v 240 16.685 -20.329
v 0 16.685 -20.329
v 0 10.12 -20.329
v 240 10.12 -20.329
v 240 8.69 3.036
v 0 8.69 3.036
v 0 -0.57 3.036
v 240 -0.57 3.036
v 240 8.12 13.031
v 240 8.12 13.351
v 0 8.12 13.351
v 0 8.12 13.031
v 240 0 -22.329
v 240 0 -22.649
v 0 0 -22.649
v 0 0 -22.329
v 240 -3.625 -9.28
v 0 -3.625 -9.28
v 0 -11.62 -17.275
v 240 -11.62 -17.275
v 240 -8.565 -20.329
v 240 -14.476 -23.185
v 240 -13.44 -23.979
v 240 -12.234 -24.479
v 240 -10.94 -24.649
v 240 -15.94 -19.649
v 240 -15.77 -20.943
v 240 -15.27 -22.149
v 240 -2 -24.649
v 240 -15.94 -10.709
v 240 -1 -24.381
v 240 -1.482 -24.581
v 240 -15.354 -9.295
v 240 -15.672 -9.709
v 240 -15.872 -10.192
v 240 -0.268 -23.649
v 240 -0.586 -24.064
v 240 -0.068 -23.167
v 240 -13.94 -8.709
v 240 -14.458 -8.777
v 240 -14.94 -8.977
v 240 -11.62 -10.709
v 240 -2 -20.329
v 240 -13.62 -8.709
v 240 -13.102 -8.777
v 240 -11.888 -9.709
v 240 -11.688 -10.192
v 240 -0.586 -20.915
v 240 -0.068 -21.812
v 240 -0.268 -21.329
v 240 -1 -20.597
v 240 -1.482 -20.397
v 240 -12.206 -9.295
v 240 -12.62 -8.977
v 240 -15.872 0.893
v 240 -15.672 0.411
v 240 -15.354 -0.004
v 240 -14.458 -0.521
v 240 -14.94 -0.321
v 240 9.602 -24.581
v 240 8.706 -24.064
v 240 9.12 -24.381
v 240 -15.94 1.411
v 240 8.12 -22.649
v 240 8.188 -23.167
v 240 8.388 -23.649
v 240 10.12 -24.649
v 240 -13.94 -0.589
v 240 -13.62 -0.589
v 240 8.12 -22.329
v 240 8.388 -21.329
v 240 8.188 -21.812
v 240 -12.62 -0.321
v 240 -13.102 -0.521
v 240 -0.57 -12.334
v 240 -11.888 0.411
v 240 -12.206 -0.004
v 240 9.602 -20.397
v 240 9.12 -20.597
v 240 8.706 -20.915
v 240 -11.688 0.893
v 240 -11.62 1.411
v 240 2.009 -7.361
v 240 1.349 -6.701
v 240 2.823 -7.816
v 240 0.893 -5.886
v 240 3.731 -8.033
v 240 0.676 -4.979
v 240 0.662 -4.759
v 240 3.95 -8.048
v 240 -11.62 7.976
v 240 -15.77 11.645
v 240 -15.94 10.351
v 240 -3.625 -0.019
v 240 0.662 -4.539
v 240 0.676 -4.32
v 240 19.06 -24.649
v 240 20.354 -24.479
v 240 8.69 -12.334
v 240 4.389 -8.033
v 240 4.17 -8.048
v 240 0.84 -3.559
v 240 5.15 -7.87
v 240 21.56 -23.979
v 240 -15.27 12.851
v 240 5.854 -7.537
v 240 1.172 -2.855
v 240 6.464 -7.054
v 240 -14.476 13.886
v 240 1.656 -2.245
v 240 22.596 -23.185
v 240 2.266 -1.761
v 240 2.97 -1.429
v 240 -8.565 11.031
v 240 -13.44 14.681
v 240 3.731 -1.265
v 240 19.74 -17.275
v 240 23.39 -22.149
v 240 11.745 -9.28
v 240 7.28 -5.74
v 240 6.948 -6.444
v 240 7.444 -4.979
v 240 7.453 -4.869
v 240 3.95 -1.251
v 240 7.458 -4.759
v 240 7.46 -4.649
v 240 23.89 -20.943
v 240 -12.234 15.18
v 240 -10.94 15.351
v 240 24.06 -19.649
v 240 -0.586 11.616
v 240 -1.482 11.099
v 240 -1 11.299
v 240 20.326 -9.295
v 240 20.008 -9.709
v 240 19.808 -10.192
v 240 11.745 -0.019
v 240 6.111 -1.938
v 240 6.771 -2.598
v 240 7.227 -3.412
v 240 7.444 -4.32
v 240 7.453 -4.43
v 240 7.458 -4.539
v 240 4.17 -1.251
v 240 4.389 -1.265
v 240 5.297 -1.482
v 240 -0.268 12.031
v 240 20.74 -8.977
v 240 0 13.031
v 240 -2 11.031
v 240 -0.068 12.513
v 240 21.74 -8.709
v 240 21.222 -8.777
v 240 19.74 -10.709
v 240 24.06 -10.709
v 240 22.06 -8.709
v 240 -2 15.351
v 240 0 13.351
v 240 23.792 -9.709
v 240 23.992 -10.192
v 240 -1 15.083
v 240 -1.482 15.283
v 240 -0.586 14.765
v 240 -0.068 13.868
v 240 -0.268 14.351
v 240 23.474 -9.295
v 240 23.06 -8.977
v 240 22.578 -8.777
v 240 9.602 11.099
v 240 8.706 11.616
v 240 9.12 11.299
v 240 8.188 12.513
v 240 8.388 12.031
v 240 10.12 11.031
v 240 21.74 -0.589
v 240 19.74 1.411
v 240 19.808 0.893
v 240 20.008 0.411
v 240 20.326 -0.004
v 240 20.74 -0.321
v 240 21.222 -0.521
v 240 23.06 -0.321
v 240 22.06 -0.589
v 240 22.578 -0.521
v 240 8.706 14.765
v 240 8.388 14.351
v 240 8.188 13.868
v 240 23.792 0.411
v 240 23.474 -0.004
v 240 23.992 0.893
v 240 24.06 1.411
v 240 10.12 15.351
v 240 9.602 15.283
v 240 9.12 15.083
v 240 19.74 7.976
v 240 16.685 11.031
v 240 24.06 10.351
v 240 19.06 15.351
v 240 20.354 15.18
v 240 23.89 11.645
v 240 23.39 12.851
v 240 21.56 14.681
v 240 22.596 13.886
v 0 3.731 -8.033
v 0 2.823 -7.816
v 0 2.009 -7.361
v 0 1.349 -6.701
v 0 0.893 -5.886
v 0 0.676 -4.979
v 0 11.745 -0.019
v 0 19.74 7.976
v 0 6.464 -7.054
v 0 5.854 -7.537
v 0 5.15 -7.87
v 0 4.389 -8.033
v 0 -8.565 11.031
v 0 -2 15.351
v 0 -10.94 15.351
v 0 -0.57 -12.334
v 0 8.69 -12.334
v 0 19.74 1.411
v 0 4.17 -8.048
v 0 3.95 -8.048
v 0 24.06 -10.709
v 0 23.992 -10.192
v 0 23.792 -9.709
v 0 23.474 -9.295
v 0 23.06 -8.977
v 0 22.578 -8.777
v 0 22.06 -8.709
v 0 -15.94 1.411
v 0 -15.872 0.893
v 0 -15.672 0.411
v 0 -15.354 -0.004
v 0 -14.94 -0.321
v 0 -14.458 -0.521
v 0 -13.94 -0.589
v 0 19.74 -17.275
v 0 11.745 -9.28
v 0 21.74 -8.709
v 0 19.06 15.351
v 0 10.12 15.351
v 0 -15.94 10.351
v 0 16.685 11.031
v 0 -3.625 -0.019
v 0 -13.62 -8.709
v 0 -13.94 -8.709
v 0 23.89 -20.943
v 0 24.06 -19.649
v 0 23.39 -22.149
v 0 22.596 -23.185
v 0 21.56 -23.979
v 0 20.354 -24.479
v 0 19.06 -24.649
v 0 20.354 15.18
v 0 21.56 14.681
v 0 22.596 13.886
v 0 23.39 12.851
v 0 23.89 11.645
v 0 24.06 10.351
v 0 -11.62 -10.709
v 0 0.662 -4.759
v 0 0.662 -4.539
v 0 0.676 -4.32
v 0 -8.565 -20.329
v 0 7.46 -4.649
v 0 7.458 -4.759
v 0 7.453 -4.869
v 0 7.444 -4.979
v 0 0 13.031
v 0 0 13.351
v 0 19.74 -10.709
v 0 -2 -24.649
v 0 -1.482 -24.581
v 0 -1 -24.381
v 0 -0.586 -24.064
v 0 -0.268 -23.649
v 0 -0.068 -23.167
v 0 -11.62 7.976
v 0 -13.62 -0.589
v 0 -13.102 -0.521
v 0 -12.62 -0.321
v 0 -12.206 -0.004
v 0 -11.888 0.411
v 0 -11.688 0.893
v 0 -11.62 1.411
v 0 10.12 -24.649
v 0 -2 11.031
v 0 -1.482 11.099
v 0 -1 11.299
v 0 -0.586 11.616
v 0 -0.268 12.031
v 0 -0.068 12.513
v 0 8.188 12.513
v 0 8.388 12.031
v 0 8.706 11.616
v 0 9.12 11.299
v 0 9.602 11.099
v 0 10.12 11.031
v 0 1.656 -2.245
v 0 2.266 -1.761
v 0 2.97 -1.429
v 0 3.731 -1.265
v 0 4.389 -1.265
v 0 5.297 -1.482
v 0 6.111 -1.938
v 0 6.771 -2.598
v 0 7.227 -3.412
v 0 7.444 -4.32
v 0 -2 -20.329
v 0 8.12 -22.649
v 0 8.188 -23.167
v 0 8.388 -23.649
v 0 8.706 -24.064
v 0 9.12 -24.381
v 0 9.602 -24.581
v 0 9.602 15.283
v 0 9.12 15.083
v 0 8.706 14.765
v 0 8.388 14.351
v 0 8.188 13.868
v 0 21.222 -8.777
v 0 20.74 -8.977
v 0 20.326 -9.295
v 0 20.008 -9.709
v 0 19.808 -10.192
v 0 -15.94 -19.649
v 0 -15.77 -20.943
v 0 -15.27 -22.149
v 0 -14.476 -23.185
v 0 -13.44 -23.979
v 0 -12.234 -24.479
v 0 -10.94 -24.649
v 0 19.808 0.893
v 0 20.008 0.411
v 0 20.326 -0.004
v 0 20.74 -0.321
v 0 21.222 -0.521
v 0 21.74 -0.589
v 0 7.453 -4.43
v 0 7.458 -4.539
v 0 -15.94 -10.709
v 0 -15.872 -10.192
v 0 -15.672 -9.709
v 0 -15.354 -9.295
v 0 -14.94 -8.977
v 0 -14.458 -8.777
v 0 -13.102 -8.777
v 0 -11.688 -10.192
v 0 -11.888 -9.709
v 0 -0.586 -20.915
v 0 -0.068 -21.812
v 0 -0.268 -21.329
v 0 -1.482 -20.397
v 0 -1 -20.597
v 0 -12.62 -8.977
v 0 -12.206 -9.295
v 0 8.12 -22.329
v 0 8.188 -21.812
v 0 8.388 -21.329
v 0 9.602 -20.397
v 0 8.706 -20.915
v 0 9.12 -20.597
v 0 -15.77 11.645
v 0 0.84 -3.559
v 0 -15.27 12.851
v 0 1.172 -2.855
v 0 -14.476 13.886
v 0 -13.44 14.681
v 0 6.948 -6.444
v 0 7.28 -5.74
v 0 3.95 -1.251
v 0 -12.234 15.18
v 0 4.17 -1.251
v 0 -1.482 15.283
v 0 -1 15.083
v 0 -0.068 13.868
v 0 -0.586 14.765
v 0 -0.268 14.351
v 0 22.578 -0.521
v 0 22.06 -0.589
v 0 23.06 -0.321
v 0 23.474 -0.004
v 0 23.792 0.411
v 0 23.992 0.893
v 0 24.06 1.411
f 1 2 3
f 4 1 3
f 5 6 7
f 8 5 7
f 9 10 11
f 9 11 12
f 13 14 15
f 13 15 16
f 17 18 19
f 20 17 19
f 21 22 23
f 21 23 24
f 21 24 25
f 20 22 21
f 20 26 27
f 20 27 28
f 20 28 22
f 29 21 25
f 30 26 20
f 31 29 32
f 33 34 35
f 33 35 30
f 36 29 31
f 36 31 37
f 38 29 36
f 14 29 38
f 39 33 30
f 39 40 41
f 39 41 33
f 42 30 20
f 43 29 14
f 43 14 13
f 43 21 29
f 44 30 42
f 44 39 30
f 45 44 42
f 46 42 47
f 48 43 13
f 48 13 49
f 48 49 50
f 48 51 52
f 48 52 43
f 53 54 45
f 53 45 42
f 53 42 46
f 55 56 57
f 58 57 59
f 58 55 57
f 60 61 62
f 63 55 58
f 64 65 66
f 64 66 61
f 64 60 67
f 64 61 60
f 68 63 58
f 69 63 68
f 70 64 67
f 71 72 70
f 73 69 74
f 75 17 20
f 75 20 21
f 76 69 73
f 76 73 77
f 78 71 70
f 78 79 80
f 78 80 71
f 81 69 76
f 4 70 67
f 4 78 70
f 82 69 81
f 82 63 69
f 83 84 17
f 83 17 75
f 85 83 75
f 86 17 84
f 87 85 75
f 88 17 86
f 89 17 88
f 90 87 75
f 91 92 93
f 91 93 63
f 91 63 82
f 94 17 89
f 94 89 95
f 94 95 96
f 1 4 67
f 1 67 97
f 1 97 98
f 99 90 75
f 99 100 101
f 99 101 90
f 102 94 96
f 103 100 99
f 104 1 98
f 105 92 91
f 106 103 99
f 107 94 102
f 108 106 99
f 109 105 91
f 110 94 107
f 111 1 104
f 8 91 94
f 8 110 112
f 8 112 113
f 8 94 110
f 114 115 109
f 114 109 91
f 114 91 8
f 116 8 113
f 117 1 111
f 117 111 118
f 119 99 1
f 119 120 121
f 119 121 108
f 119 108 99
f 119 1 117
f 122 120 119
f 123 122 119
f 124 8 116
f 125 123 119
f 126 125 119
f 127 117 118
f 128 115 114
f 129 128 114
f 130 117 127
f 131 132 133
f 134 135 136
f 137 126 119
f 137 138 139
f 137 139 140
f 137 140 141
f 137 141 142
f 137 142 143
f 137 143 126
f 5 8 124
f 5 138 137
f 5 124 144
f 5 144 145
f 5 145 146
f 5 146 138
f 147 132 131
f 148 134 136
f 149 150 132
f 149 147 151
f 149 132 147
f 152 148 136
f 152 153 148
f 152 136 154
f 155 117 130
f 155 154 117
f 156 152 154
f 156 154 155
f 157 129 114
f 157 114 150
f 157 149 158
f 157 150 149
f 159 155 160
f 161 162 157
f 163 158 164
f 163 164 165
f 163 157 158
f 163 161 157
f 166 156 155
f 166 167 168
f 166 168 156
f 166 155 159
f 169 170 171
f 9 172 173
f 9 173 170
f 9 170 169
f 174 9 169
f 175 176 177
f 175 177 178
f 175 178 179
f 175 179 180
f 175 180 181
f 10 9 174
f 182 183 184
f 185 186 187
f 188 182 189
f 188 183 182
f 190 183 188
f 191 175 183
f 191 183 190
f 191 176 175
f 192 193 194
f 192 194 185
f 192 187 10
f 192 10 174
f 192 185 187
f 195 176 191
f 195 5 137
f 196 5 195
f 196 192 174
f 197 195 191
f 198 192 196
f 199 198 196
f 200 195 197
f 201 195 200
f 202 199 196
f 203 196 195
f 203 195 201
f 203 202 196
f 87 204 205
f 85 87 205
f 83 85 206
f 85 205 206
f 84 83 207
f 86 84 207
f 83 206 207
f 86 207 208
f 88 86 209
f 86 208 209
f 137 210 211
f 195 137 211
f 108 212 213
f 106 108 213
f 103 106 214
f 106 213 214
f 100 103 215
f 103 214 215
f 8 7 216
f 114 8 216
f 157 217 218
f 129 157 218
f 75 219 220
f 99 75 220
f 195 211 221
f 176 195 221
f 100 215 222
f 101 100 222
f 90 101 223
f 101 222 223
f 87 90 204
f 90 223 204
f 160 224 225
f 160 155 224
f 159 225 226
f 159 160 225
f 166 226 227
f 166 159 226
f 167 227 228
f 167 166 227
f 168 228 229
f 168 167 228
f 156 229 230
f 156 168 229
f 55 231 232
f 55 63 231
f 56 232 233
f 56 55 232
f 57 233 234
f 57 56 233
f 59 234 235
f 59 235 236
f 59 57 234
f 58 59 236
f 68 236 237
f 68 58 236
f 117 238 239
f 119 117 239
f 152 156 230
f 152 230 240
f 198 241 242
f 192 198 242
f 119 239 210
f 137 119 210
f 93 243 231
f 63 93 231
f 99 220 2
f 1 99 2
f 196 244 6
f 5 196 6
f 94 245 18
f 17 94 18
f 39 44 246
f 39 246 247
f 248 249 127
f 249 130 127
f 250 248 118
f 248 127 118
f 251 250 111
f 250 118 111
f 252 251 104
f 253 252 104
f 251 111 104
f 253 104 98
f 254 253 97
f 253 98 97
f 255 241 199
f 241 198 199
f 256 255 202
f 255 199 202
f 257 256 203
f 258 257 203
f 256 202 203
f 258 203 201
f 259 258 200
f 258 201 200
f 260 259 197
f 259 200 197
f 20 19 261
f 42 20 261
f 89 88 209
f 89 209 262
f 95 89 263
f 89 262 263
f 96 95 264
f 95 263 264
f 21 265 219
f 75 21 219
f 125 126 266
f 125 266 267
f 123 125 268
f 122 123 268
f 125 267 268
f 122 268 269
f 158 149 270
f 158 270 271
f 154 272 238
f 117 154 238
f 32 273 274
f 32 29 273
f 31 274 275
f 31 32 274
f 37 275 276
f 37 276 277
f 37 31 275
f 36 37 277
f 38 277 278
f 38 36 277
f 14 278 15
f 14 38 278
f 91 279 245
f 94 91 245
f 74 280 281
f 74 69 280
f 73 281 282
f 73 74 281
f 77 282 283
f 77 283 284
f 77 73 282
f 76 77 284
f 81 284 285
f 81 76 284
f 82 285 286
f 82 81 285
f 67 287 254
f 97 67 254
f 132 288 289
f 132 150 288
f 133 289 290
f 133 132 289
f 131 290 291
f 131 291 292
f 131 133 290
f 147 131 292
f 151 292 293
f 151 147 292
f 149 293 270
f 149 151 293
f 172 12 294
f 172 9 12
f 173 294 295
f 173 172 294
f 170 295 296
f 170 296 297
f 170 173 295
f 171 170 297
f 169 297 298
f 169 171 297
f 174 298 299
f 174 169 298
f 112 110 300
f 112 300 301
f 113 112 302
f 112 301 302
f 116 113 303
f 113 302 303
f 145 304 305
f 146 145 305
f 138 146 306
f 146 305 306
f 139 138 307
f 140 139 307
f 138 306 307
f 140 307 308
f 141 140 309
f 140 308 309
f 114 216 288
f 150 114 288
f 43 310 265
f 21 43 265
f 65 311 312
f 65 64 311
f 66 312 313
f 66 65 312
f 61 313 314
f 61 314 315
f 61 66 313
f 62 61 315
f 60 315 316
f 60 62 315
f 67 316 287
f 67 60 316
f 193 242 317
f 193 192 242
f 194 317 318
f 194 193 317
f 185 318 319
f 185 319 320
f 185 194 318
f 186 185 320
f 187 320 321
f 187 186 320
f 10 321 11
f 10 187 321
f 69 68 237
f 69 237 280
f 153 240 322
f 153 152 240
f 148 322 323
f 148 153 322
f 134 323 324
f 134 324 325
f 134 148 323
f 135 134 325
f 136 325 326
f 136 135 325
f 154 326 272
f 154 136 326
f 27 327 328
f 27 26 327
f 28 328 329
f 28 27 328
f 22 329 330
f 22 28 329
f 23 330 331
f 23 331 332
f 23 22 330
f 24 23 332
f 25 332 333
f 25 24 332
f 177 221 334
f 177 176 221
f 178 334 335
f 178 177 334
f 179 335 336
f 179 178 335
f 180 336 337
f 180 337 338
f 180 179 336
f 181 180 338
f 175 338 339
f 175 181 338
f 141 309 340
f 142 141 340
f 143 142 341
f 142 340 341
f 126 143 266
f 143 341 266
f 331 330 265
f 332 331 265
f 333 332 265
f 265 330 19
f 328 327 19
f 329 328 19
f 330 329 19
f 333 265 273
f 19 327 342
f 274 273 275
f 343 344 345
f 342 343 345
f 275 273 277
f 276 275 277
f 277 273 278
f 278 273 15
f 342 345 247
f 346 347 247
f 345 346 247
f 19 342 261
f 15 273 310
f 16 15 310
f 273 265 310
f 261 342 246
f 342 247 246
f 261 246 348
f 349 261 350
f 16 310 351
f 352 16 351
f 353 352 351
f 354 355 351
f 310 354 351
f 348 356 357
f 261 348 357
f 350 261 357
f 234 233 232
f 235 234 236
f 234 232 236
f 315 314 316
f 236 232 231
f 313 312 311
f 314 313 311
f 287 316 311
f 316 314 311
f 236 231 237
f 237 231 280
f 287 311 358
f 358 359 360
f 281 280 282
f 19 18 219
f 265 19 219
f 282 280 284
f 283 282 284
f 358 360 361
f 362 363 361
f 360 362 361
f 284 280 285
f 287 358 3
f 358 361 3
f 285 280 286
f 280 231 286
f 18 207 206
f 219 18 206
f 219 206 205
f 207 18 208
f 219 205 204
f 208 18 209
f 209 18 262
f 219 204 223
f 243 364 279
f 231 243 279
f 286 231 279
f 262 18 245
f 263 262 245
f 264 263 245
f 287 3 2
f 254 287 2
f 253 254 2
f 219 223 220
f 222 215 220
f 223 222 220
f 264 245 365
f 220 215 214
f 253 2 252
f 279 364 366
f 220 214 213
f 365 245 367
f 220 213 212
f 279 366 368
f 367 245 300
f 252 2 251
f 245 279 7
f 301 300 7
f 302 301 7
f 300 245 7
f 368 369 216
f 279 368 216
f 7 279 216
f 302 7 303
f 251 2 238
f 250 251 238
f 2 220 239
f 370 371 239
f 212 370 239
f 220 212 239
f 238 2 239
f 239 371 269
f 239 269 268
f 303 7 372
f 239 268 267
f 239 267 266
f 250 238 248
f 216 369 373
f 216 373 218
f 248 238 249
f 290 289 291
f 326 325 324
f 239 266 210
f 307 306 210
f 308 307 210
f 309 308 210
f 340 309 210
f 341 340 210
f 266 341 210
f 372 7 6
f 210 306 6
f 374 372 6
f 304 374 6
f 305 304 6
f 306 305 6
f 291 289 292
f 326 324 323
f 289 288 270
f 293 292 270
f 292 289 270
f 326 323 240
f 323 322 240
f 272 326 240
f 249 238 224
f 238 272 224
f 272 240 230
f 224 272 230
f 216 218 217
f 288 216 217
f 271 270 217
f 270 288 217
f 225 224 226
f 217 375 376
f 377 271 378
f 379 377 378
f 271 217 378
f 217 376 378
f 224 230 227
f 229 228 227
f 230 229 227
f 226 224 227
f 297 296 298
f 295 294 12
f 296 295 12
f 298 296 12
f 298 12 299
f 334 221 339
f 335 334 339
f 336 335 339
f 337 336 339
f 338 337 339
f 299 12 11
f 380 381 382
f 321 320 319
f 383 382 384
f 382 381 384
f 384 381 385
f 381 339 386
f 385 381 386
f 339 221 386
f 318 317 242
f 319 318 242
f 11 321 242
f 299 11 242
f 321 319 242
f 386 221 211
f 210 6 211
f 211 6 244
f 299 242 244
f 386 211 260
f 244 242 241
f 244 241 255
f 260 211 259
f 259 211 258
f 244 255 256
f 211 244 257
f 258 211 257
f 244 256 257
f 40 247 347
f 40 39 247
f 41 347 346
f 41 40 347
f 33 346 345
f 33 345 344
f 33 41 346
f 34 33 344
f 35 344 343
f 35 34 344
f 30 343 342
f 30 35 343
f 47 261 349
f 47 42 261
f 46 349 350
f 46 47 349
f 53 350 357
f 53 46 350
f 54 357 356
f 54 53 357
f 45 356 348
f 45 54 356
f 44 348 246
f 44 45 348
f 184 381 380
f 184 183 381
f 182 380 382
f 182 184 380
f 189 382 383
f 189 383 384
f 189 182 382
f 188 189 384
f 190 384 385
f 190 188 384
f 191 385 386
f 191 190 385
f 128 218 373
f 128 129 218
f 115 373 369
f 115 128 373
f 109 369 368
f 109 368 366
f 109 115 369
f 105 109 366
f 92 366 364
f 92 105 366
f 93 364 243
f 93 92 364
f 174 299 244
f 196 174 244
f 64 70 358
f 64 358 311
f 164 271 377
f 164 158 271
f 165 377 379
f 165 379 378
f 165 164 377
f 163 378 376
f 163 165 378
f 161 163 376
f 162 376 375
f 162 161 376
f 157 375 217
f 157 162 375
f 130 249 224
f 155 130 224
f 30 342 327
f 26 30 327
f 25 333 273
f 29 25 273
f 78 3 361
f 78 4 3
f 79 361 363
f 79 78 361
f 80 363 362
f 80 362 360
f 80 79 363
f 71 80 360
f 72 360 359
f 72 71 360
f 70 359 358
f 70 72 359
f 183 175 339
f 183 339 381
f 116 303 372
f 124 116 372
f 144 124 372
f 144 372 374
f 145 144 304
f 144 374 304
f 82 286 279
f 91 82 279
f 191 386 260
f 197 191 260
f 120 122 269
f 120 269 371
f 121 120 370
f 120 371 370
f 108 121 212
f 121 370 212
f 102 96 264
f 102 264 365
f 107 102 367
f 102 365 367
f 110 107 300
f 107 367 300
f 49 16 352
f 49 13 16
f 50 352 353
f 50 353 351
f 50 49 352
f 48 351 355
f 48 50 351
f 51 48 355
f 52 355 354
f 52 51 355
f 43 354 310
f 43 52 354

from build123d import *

# Parameters (mm, degrees)
F1_DEPTH = 240
F2_R     = 2
F3_R     = 5


with BuildPart() as f1:
    # F0 (on Right) → F1 (new body)
    with BuildSketch(Plane.YZ):
        Polygon((-11.62, 7.9759603159), (-15.94, 12.2959603159), (-15.94, -0.5893383893), (-11.62, -0.5893383893), align=None)
        Polygon((-11.62, 11.0306616107), (-15.94, 15.3506616107), (-15.94, 12.2959603159), (-11.62, 7.9759603159), (-8.7938307864, 5.1497911023), (-7.266480139, 6.6771417497), align=None)
        Polygon((-8.5652987053, 11.0306616107), (-11.62, 11.0306616107), (-7.266480139, 6.6771417497), (-5.7391294917, 8.2044923971), align=None)
        Polygon((0, 15.3506616107), (-12.8852987053, 15.3506616107), (-8.5652987053, 11.0306616107), (0, 11.0306616107), align=None)
        Polygon((-12.8852987053, 15.3506616107), (-15.94, 15.3506616107), (-11.62, 11.0306616107), (-8.5652987053, 11.0306616107), align=None)
        Polygon((-15.94, -21.5946370946), (-11.62, -17.2746370946), (-11.62, -8.7093383893), (-15.94, -8.7093383893), align=None)
        Polygon((-3.625, -12.3343383893), (-3.625, -9.2796370946), (-11.62, -17.2746370946), (-15.94, -21.5946370946), (-15.94, -24.6493383893), (-12.8852987053, -24.6493383893), (-8.5652987053, -20.3293383893), (-0.5702987053, -12.3343383893), align=None)
        Polygon((0, -20.3293383893), (-8.5652987053, -20.3293383893), (-12.8852987053, -24.6493383893), (0, -24.6493383893), align=None)
        Polygon((14.9650698751, 9.3104327805), (8.6902987053, 3.0356616107), (11.745, 3.0356616107), (11.745, -0.0190396841), (18.0197711699, 6.2557314858), (19.74, 7.9759603159), (16.6852987053, 11.0306616107), align=None)
        Polygon((21.0052987053, 15.3506616107), (16.6852987053, 11.0306616107), (19.74, 7.9759603159), (24.06, 12.2959603159), (24.06, 15.3506616107), align=None)
        Polygon((24.06, 12.2959603159), (19.74, 7.9759603159), (19.74, -0.5893383893), (24.06, -0.5893383893), align=None)
        Polygon((8.12, 11.0306616107), (16.6852987053, 11.0306616107), (21.0052987053, 15.3506616107), (8.12, 15.3506616107), align=None)
        with BuildLine():
            Line((11.745, -9.2796370946), (11.745, -0.0190396841))
            Line((11.745, -0.0190396841), (7.4440143218, -4.3200253623))
            ThreePointArc((7.4440143218, -4.3200253623), (7.456001229, -4.4844879937), (7.46, -4.6493383893))
            ThreePointArc((7.46, -4.6493383893), (7.456001229, -4.8141887849), (7.4440143218, -4.9786514164))
            Line((7.4440143218, -4.9786514164), (11.745, -9.2796370946))
        make_face()
        with BuildLine():
            Line((3.7306869729, -8.0333527111), (-0.5702987053, -12.3343383893))
            Line((-0.5702987053, -12.3343383893), (8.6902987053, -12.3343383893))
            Line((8.6902987053, -12.3343383893), (4.3893130271, -8.0333527111))
            ThreePointArc((4.3893130271, -8.0333527111), (4.06, -8.0493383893), (3.7306869729, -8.0333527111))
        make_face()
        with BuildLine():
            Line((0.6759856782, -4.3200253623), (-3.625, -0.0190396841))
            Line((-3.625, -0.0190396841), (-3.625, -9.2796370946))
            Line((-3.625, -9.2796370946), (0.6759856782, -4.9786514164))
            ThreePointArc((0.6759856782, -4.9786514164), (0.66, -4.6493383893), (0.6759856782, -4.3200253623))
        make_face()
        with BuildLine():
            Line((8.6902987053, 3.0356616107), (-0.5702987053, 3.0356616107))
            Line((-0.5702987053, 3.0356616107), (3.7306869729, -1.2653240675))
            ThreePointArc((3.7306869729, -1.2653240675), (4.06, -1.2493383893), (4.3893130271, -1.2653240675))
            Line((4.3893130271, -1.2653240675), (8.6902987053, 3.0356616107))
        make_face()
        Polygon((-5.7391294917, 8.2044923971), (-7.266480139, 6.6771417497), (-3.625, 3.0356616107), (-0.5702987053, 3.0356616107), align=None)
        Polygon((-3.625, 3.0356616107), (-7.266480139, 6.6771417497), (-8.7938307864, 5.1497911023), (-3.625, -0.0190396841), align=None)
        Polygon((11.745, -12.3343383893), (8.6902987053, -12.3343383893), (16.6852987053, -20.3293383893), (21.0052987053, -24.6493383893), (24.06, -24.6493383893), align=None)
        Polygon((19.74, -17.2746370946), (11.745, -9.2796370946), (11.745, -12.3343383893), (24.06, -24.6493383893), (24.06, -21.5946370946), align=None)
        Polygon((19.74, -8.7093383893), (19.74, -17.2746370946), (24.06, -21.5946370946), (24.06, -8.7093383893), align=None)
        Polygon((21.0052987053, -24.6493383893), (16.6852987053, -20.3293383893), (8.12, -20.3293383893), (8.12, -24.6493383893), align=None)
        with BuildLine():
            Line((11.745, 3.0356616107), (8.6902987053, 3.0356616107))
            Line((8.6902987053, 3.0356616107), (4.3893130271, -1.2653240675))
            ThreePointArc((4.3893130271, -1.2653240675), (6.464163056, -2.2451753333), (7.4440143218, -4.3200253623))
            Line((7.4440143218, -4.3200253623), (11.745, -0.0190396841))
            Line((11.745, -0.0190396841), (11.745, 3.0356616107))
        make_face()
        with BuildLine():
            Line((1.655836944, -2.2451753333), (-3.625, 3.0356616107))
            Line((-3.625, 3.0356616107), (-3.625, -0.0190396841))
            Line((-3.625, -0.0190396841), (0.6759856782, -4.3200253623))
            ThreePointArc((0.6759856782, -4.3200253623), (0.9855894874, -3.1974430763), (1.655836944, -2.2451753333))
        make_face()
        with BuildLine():
            Line((0.6759856782, -4.9786514164), (-3.625, -9.2796370946))
            Line((-3.625, -9.2796370946), (-3.625, -12.3343383893))
            Line((-3.625, -12.3343383893), (-0.5702987053, -12.3343383893))
            Line((-0.5702987053, -12.3343383893), (3.7306869729, -8.0333527111))
            ThreePointArc((3.7306869729, -8.0333527111), (1.655836944, -7.0535014454), (0.6759856782, -4.9786514164))
        make_face()
        with BuildLine():
            Line((11.745, -12.3343383893), (6.464163056, -7.0535014454))
            ThreePointArc((6.464163056, -7.0535014454), (5.511895313, -7.7237489019), (4.3893130271, -8.0333527111))
            Line((4.3893130271, -8.0333527111), (8.6902987053, -12.3343383893))
            Line((8.6902987053, -12.3343383893), (11.745, -12.3343383893))
        make_face()
        with BuildLine():
            ThreePointArc((7.4440143218, -4.9786514164), (7.1344105126, -6.1012337024), (6.464163056, -7.0535014454))
            Line((6.464163056, -7.0535014454), (11.745, -12.3343383893))
            Line((11.745, -12.3343383893), (11.745, -9.2796370946))
            Line((11.745, -9.2796370946), (7.4440143218, -4.9786514164))
        make_face()
        with BuildLine():
            Line((-0.5702987053, 3.0356616107), (-3.625, 3.0356616107))
            Line((-3.625, 3.0356616107), (1.655836944, -2.2451753333))
            ThreePointArc((1.655836944, -2.2451753333), (2.608104687, -1.5749278767), (3.7306869729, -1.2653240675))
            Line((3.7306869729, -1.2653240675), (-0.5702987053, 3.0356616107))
        make_face()
    extrude(amount=F1_DEPTH)

    # F2
    f2_edges = [f1.edges().sort_by_distance(p)[0] for p in [
        (120, 0, 11.030662),
        (120, -11.62, -0.589338),
        (120, -15.94, -0.589338),
        (120, 0, 15.350662),
        (120, 8.12, 11.030662),
        (120, 19.74, -0.589338),
        (120, 24.06, -0.589338),
        (120, 8.12, -24.649338),
        (120, 8.12, 15.350662),
        (120, -15.94, -8.709338),
        (120, -11.62, -8.709338),
        (120, 0, -24.649338),
        (120, 0, -20.329338),
        (120, 8.12, -20.329338),
        (120, 19.74, -8.709338),
        (120, 24.06, -8.709338),
    ]]
    fillet(f2_edges, radius=F2_R)

    # F3
    f3_edges = [f1.edges().sort_by_distance(p)[0] for p in [
        (120, -15.94, 15.350662),
        (120, 24.06, 15.350662),
        (120, 24.06, -24.649338),
        (120, -15.94, -24.649338),
    ]]
    fillet(f3_edges, radius=F3_R)


solid = f1.part
